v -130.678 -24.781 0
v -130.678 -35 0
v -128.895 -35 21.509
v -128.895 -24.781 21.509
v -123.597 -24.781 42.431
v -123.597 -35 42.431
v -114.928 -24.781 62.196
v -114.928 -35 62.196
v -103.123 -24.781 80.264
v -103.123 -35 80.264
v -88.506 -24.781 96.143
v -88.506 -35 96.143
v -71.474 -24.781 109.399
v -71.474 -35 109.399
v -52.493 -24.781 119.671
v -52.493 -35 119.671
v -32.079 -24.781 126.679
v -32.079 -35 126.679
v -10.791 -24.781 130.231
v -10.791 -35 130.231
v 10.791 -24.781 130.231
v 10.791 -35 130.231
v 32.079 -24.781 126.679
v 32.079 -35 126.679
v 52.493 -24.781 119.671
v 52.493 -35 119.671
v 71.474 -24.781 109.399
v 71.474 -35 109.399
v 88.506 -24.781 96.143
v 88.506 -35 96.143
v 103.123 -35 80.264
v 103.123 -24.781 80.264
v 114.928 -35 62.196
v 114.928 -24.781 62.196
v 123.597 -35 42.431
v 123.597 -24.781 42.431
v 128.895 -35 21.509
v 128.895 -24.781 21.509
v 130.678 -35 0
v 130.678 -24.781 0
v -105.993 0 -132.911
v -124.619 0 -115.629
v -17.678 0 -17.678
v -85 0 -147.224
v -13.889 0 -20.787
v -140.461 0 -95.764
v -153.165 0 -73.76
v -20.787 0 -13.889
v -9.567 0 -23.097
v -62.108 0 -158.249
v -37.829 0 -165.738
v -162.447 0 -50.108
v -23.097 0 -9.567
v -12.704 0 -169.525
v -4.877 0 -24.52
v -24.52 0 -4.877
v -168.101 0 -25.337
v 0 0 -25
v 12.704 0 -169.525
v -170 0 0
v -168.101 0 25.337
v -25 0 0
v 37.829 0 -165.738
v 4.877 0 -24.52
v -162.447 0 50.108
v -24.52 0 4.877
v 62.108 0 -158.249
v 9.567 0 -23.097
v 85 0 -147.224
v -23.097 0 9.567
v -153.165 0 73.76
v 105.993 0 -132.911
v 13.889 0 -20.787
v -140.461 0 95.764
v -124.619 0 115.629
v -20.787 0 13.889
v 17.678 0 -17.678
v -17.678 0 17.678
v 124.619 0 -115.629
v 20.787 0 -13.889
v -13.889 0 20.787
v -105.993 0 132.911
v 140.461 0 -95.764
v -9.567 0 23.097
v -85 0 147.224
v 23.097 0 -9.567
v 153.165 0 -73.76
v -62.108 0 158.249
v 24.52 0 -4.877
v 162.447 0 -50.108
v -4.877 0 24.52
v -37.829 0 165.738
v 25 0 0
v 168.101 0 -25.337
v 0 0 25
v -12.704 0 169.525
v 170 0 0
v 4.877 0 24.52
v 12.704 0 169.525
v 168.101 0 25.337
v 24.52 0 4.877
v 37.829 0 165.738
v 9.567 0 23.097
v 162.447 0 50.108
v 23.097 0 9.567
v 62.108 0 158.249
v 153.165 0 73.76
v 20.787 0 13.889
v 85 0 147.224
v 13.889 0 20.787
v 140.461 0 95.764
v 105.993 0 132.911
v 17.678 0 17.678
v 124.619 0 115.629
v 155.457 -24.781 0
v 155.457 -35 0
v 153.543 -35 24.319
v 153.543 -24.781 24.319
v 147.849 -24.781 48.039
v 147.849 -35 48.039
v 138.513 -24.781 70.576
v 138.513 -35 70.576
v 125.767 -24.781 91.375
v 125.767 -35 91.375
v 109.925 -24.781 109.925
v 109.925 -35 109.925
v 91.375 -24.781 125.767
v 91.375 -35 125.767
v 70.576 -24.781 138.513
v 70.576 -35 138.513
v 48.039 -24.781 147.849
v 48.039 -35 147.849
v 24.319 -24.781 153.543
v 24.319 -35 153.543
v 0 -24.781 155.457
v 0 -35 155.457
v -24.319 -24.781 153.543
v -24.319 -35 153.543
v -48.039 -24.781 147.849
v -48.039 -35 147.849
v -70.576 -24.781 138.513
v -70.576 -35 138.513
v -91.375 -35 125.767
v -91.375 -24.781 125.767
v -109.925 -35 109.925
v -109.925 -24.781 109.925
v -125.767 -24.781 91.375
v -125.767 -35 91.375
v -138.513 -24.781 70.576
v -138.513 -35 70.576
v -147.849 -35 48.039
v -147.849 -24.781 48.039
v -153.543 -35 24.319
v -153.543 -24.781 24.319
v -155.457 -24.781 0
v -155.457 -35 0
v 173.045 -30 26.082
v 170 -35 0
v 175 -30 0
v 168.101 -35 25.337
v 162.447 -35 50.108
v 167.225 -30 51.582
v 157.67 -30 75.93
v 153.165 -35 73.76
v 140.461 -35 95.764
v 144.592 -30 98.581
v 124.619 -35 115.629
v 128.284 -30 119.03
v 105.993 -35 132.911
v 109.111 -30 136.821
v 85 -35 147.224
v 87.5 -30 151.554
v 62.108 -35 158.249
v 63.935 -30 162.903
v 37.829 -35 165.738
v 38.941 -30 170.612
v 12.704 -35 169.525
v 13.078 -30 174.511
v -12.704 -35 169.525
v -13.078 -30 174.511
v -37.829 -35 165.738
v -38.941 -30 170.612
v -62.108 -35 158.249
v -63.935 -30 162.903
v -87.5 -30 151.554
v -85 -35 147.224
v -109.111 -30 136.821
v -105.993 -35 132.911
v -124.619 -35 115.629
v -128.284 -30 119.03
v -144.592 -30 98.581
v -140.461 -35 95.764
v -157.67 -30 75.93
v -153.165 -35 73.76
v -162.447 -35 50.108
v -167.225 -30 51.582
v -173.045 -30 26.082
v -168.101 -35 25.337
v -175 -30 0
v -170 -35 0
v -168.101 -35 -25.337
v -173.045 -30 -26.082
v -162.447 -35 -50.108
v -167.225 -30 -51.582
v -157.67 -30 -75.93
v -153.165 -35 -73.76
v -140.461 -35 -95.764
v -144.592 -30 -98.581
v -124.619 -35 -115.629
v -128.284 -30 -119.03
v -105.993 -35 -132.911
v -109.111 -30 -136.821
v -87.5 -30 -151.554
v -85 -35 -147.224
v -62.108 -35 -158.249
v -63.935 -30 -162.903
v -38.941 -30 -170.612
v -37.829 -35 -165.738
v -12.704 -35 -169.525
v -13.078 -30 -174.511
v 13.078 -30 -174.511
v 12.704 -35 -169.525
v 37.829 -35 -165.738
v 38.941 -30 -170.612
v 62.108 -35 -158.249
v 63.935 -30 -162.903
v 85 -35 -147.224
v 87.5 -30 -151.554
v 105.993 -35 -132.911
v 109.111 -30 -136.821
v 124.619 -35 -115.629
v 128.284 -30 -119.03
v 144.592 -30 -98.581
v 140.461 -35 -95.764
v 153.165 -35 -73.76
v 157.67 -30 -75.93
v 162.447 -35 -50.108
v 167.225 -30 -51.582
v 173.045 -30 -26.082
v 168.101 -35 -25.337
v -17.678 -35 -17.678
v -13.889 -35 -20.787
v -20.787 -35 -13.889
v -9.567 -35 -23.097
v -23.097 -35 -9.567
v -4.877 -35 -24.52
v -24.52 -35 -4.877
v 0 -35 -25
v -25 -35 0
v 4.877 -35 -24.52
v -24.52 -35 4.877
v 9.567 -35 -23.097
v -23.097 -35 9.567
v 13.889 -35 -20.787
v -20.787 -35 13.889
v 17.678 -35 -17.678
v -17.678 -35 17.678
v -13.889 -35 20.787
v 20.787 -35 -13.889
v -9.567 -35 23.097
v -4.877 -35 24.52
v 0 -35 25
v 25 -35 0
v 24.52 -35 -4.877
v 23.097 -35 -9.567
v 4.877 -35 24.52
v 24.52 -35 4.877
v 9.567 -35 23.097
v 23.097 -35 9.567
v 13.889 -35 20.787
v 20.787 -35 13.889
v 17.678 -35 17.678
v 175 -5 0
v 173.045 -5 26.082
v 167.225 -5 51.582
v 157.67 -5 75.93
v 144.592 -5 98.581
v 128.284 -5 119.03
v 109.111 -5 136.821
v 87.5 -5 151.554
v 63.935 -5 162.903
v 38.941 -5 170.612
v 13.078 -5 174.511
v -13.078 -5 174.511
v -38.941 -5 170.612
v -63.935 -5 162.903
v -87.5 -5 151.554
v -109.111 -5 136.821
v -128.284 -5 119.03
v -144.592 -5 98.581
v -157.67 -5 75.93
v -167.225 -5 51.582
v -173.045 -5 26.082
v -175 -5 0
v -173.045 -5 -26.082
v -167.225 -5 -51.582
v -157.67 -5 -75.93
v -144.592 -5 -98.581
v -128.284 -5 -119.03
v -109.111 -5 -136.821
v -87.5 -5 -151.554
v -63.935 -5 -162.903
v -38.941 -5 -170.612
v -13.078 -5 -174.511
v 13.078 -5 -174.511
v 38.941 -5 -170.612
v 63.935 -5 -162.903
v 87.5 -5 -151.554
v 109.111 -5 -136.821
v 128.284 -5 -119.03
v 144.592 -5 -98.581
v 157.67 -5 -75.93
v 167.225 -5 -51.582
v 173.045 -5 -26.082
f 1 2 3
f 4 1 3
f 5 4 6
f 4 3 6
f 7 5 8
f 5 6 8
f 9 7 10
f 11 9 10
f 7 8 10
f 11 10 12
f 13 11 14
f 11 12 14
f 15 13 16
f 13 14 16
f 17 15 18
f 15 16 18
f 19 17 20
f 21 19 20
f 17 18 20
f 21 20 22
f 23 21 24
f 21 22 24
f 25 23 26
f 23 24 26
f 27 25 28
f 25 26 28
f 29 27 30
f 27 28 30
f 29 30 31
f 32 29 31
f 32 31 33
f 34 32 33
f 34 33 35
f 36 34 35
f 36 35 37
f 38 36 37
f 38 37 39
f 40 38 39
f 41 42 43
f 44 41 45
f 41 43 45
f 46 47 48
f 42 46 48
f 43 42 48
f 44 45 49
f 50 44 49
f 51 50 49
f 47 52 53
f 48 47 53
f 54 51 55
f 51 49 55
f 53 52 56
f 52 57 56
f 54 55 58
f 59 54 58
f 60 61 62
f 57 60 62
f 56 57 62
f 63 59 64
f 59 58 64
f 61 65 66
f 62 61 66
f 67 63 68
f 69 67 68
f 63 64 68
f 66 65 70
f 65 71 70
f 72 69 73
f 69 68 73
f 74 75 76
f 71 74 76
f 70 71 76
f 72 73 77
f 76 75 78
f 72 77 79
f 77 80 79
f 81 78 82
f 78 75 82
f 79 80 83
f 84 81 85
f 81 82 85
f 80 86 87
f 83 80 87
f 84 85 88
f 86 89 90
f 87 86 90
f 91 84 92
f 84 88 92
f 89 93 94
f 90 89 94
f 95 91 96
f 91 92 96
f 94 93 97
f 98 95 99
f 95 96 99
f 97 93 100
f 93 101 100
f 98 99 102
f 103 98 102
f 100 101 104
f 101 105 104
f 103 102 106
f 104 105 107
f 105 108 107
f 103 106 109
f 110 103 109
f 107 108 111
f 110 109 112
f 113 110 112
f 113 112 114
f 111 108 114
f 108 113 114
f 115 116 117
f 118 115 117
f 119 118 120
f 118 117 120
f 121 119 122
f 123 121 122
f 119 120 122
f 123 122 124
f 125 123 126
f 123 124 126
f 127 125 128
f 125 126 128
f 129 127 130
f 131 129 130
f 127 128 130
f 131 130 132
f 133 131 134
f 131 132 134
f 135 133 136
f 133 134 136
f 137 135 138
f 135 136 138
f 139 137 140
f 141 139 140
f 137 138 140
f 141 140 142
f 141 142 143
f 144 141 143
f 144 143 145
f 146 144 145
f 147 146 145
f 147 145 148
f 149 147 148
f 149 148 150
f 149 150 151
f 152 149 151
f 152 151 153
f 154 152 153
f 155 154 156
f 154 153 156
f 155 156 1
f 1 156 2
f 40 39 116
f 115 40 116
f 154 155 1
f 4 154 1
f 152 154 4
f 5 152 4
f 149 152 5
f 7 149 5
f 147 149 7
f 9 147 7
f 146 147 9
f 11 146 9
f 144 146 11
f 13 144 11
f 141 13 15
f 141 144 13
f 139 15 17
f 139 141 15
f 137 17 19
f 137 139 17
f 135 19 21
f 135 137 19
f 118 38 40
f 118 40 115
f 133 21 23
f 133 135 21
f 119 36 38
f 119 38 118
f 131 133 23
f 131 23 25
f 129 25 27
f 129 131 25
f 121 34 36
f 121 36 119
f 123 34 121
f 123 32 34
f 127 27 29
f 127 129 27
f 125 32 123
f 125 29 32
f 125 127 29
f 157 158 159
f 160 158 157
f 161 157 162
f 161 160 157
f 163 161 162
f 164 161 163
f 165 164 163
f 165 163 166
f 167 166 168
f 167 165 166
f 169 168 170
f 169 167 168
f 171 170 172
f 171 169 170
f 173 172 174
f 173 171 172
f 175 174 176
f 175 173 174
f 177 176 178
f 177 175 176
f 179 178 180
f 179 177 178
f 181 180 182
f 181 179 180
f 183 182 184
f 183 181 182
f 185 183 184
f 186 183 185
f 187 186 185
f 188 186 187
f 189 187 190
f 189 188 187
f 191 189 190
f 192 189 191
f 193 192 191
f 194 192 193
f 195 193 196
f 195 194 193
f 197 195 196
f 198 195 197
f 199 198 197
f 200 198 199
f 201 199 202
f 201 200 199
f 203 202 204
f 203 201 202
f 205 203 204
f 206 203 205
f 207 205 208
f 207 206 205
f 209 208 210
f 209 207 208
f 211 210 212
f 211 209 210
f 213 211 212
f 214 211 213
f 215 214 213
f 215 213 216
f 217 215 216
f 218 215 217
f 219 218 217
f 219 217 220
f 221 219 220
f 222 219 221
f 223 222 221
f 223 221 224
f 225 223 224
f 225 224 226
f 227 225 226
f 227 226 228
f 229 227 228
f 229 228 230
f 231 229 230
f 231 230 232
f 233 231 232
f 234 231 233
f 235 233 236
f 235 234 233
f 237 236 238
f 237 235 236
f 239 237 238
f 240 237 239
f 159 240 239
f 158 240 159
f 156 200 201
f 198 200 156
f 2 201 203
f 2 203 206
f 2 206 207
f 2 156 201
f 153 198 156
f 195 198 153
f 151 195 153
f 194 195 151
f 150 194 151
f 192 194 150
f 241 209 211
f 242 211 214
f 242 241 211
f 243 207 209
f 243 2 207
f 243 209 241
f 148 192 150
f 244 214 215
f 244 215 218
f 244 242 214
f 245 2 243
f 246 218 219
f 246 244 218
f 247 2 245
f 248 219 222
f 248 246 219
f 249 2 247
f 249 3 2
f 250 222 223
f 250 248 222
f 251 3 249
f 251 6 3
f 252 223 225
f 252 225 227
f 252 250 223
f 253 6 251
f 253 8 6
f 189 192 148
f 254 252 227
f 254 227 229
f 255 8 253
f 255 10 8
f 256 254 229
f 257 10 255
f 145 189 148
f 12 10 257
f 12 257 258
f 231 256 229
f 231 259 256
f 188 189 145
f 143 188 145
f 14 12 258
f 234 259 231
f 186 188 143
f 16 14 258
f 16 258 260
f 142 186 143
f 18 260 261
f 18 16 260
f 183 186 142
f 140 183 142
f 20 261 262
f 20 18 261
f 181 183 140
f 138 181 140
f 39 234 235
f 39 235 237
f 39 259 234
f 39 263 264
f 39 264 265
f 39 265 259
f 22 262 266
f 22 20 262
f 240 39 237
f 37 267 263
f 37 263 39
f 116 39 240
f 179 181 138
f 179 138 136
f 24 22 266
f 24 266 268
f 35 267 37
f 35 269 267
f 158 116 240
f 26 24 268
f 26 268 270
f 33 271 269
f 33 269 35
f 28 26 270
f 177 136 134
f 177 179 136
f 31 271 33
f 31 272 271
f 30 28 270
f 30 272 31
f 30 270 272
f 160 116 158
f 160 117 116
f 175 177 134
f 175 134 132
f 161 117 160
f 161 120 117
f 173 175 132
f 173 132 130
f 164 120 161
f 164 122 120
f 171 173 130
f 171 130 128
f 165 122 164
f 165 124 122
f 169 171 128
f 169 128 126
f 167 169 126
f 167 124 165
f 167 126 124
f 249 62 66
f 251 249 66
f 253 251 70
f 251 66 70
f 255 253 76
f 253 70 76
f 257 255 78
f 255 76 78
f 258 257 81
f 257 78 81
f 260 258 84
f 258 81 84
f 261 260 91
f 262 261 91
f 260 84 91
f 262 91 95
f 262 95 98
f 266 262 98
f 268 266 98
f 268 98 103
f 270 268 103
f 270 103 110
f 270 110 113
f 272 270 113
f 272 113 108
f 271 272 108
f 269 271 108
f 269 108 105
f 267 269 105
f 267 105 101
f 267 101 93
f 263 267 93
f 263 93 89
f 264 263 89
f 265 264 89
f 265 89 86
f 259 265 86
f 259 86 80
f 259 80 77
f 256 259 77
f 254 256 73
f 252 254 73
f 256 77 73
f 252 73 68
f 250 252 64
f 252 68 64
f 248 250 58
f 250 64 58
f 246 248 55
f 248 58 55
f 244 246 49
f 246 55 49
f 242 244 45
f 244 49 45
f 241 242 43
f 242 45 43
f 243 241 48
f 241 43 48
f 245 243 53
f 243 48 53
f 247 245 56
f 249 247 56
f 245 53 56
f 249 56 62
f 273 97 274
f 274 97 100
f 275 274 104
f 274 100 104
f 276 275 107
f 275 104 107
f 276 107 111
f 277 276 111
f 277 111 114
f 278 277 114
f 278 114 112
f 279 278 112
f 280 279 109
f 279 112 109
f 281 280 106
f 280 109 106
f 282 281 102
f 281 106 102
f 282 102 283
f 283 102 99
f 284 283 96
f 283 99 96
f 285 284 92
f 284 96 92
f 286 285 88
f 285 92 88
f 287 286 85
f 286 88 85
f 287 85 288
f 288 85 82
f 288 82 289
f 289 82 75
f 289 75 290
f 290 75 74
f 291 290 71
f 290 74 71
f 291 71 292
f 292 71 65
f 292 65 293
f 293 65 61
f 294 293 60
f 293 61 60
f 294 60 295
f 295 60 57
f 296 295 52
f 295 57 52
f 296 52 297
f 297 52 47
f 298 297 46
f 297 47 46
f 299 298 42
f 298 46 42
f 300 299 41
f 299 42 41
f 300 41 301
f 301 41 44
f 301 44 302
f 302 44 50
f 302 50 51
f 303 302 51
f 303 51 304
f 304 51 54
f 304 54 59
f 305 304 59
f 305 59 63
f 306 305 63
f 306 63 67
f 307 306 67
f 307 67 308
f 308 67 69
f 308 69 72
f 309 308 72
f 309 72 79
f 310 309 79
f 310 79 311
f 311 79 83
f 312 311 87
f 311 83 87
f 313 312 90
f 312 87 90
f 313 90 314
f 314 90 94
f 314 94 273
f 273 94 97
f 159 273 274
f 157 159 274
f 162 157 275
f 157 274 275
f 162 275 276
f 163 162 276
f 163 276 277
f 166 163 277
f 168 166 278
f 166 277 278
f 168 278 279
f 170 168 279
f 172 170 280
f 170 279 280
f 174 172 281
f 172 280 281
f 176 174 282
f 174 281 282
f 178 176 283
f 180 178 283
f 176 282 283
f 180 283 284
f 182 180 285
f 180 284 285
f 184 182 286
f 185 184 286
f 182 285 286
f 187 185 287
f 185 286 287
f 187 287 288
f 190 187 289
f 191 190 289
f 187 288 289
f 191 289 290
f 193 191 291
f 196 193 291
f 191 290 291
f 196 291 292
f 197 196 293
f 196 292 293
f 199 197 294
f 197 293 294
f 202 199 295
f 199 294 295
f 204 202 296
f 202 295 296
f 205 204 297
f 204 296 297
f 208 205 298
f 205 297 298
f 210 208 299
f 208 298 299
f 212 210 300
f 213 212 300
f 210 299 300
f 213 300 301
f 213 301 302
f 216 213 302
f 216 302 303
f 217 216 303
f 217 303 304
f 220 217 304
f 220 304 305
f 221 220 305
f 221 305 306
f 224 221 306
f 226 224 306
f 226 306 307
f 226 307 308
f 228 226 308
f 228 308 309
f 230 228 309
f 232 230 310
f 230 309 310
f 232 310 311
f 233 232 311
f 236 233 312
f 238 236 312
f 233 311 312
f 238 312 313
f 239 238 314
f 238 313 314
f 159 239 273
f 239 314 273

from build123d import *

# Parameters (mm, degrees)
F0_R     = 175
F1_DEPTH = 35
F3_D     = 50
F4_SIZE  = 5
F6_DEPTH = 10.21899


with BuildPart() as f1:
    # F0 (on Front) → F1 (new body)
    with BuildSketch(Plane.XZ):
        Circle(F0_R)
    extrude(amount=F1_DEPTH)

    # F3 (through all)
    with Locations(Plane.XZ.offset(35)):
        with Locations((0, 0)):
            Hole(F3_D / 2)

    # F4
    f4_edges = [f1.edges().sort_by_distance(p)[0] for p in [
        (-175, -35, 0),
        (-175, 0, 0),
    ]]
    chamfer(f4_edges, length=F4_SIZE)

    # F5 (on face) → F6 (cut)
    with BuildSketch(Plane.XZ.offset(35)):
        with BuildLine():
            Line((-155.457131, 0), (-130.677676, 0))
            ThreePointArc((-130.677676, 0), (0, 130.677676), (130.677676, 0))
            Line((130.677676, 0), (155.457131, 0))
            ThreePointArc((155.457131, 0), (0, 155.457131), (-155.457131, 0))
        make_face()
    extrude(amount=-F6_DEPTH, mode=Mode.SUBTRACT)


solid = f1.part
